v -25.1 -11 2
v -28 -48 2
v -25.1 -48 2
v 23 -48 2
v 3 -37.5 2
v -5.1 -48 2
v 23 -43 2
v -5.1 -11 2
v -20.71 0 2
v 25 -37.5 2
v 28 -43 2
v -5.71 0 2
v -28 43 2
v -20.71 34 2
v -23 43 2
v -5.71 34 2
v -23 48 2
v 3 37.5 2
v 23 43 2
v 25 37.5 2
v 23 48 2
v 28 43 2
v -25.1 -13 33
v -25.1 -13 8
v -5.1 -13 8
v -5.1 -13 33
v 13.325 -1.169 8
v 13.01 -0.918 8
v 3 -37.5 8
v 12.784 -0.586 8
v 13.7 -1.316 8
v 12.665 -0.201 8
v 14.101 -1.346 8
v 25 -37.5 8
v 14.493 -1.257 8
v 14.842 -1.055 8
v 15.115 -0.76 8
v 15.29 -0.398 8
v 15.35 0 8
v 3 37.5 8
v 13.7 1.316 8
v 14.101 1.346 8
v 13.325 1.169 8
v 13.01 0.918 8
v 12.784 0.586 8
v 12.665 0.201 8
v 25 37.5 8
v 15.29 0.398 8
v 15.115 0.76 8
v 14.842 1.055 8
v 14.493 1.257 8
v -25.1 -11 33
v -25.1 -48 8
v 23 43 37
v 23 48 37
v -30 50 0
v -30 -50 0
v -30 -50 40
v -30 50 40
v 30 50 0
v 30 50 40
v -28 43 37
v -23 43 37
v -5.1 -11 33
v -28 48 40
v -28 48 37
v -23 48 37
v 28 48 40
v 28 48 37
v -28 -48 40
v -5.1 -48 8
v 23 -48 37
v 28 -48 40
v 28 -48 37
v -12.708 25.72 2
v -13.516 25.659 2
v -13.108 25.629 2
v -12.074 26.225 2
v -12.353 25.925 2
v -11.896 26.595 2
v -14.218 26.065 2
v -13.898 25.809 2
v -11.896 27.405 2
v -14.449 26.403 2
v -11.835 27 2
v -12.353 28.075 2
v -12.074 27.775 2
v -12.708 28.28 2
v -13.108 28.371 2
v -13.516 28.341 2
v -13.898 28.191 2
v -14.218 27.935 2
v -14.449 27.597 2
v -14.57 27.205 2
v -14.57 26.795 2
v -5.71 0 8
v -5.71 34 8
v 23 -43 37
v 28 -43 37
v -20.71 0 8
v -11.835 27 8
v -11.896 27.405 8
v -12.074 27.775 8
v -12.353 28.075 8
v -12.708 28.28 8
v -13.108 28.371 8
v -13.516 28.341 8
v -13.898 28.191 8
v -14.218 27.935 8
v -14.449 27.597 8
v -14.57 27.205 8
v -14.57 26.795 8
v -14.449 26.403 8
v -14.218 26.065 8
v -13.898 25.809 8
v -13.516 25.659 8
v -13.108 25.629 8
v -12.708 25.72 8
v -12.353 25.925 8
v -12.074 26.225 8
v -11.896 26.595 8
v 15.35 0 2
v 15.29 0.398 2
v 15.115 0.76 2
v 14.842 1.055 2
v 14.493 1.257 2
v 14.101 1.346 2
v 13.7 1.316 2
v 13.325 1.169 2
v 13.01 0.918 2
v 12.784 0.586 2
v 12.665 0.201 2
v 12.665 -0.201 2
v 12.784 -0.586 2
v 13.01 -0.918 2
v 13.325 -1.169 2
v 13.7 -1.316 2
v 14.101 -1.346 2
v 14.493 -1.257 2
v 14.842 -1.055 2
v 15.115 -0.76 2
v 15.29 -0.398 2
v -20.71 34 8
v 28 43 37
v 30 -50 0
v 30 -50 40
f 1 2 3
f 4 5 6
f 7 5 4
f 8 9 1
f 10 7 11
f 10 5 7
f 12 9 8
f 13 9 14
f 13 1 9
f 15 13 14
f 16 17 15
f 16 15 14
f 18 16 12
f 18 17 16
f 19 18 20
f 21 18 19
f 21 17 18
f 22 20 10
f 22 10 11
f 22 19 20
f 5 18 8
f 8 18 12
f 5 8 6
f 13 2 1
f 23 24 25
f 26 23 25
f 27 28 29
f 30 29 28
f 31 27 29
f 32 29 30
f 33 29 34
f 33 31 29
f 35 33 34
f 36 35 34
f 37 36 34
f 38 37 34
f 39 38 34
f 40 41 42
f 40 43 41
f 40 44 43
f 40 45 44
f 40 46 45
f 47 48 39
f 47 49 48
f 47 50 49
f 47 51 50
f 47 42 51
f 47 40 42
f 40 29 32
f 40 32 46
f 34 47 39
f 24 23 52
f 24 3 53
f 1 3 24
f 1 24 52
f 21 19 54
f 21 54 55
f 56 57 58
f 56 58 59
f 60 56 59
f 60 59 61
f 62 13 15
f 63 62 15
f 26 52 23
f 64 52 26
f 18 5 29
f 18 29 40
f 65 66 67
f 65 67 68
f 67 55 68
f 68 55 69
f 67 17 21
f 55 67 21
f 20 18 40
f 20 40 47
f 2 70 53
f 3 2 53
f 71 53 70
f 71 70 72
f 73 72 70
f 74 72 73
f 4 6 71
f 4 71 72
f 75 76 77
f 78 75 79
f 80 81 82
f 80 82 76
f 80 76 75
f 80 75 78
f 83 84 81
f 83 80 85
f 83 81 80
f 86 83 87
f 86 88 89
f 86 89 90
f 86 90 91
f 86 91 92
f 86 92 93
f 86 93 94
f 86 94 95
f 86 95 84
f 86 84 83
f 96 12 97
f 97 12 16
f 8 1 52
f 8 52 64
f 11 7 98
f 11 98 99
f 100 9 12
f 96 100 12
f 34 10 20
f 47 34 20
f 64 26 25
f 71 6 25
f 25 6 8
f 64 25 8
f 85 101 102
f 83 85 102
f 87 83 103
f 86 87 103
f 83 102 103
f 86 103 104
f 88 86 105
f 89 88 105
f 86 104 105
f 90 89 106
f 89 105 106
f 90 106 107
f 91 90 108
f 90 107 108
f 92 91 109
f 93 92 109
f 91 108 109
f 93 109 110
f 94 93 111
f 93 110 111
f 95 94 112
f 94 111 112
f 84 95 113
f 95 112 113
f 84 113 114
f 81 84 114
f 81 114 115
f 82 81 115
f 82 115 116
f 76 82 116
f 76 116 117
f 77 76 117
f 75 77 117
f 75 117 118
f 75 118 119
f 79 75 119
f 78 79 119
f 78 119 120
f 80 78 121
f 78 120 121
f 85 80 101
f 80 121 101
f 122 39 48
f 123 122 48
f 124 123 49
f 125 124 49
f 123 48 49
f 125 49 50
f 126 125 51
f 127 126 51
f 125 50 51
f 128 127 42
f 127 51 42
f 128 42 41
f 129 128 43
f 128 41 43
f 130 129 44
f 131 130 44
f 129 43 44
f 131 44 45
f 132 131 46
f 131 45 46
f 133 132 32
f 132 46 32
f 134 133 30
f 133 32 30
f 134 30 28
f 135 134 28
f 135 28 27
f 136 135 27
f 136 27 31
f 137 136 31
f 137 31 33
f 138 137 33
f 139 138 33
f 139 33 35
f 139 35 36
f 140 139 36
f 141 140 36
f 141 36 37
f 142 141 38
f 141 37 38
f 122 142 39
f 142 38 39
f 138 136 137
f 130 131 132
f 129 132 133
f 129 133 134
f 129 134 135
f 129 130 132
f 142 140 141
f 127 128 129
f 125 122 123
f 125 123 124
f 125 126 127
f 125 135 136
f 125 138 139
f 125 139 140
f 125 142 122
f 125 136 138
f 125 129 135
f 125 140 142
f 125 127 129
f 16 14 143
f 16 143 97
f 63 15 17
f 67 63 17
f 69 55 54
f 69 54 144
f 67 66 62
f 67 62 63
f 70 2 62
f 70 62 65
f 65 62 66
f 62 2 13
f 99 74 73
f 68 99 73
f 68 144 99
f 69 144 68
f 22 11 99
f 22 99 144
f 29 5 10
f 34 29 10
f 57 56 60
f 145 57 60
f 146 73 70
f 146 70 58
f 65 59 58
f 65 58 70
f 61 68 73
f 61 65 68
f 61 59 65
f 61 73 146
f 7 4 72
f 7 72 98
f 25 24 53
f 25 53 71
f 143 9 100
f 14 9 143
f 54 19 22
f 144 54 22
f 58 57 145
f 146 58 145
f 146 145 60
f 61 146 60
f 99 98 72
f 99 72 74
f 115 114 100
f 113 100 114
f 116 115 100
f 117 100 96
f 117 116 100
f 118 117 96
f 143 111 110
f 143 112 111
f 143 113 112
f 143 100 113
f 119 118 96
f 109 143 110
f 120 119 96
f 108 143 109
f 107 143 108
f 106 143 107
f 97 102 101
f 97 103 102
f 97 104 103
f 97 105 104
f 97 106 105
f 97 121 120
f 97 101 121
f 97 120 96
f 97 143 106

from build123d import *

# Parameters (mm, degrees)
F0_W      = 60
F0_H      = 100
F1_DEPTH  = 40
F2_T      = -2
F3_W      = 22
F3_H      = 75
F4_DEPTH  = 6
F5_R      = 1.35
F6_DEPTH  = 6
F7_W      = 20
F7_H      = 37
F8_DEPTH  = 6
F9_W      = 20
F9_H      = 2
F10_DEPTH = 25
F11_W     = 15
F11_H     = 34
F12_DEPTH = 6
F13_R     = 1.375
F14_DEPTH = 6
F15_W     = 5
F15_H     = 5
F16_DEPTH = 35


with BuildPart() as f1:
    # F0 (on Top) → F1 (new body)
    with BuildSketch(Plane.XY):
        Rectangle(F0_W, F0_H)
    extrude(amount=F1_DEPTH)

    # F2
    f2_openings = [f1.faces().sort_by_distance(p)[0] for p in [
        (0, 0, 40),
    ]]
    offset(amount=F2_T, openings=f2_openings)

    # F3 (on face) → F4 (join)
    with BuildSketch(Plane.XY.offset(2)):
        with Locations((14, 0)):
            Rectangle(F3_W, F3_H)
    extrude(amount=F4_DEPTH)

    # F5 (on face) → F6 (cut)
    with BuildSketch(Plane.XY.offset(8)):
        with Locations((14, 0)):
            Circle(F5_R)
    extrude(amount=-F6_DEPTH, mode=Mode.SUBTRACT)

    # F7 (on face) → F8 (join)
    with BuildSketch(Plane.XY.offset(2)):
        with Locations((-15.1, -29.5)):
            Rectangle(F7_W, F7_H)
    extrude(amount=F8_DEPTH)

    # F9 (on face) → F10 (join)
    with BuildSketch(Plane.XY.offset(8)):
        with Locations((-15.1, -12)):
            Rectangle(F9_W, F9_H)
    extrude(amount=F10_DEPTH)

    # F11 (on face) → F12 (join)
    with BuildSketch(Plane.XY.offset(2)):
        with Locations((-13.210342, 17)):
            Rectangle(F11_W, F11_H)
    extrude(amount=F12_DEPTH)

    # F13 (on face) → F14 (cut)
    with BuildSketch(Plane.XY.offset(8)):
        with Locations((-13.210342, 27)):
            Circle(F13_R)
    extrude(amount=-F14_DEPTH, mode=Mode.SUBTRACT)

    # F15 (on face) → F16 (join)
    with BuildSketch(Plane.XY.offset(2)):
        with Locations((-25.5, 45.5)):
            Rectangle(F15_W, F15_H)
        with Locations((25.5, 45.5)):
            Rectangle(F15_W, F15_H)
        with Locations((25.5, -45.5)):
            Rectangle(F15_W, F15_H)
    extrude(amount=F16_DEPTH)


solid = f1.part
